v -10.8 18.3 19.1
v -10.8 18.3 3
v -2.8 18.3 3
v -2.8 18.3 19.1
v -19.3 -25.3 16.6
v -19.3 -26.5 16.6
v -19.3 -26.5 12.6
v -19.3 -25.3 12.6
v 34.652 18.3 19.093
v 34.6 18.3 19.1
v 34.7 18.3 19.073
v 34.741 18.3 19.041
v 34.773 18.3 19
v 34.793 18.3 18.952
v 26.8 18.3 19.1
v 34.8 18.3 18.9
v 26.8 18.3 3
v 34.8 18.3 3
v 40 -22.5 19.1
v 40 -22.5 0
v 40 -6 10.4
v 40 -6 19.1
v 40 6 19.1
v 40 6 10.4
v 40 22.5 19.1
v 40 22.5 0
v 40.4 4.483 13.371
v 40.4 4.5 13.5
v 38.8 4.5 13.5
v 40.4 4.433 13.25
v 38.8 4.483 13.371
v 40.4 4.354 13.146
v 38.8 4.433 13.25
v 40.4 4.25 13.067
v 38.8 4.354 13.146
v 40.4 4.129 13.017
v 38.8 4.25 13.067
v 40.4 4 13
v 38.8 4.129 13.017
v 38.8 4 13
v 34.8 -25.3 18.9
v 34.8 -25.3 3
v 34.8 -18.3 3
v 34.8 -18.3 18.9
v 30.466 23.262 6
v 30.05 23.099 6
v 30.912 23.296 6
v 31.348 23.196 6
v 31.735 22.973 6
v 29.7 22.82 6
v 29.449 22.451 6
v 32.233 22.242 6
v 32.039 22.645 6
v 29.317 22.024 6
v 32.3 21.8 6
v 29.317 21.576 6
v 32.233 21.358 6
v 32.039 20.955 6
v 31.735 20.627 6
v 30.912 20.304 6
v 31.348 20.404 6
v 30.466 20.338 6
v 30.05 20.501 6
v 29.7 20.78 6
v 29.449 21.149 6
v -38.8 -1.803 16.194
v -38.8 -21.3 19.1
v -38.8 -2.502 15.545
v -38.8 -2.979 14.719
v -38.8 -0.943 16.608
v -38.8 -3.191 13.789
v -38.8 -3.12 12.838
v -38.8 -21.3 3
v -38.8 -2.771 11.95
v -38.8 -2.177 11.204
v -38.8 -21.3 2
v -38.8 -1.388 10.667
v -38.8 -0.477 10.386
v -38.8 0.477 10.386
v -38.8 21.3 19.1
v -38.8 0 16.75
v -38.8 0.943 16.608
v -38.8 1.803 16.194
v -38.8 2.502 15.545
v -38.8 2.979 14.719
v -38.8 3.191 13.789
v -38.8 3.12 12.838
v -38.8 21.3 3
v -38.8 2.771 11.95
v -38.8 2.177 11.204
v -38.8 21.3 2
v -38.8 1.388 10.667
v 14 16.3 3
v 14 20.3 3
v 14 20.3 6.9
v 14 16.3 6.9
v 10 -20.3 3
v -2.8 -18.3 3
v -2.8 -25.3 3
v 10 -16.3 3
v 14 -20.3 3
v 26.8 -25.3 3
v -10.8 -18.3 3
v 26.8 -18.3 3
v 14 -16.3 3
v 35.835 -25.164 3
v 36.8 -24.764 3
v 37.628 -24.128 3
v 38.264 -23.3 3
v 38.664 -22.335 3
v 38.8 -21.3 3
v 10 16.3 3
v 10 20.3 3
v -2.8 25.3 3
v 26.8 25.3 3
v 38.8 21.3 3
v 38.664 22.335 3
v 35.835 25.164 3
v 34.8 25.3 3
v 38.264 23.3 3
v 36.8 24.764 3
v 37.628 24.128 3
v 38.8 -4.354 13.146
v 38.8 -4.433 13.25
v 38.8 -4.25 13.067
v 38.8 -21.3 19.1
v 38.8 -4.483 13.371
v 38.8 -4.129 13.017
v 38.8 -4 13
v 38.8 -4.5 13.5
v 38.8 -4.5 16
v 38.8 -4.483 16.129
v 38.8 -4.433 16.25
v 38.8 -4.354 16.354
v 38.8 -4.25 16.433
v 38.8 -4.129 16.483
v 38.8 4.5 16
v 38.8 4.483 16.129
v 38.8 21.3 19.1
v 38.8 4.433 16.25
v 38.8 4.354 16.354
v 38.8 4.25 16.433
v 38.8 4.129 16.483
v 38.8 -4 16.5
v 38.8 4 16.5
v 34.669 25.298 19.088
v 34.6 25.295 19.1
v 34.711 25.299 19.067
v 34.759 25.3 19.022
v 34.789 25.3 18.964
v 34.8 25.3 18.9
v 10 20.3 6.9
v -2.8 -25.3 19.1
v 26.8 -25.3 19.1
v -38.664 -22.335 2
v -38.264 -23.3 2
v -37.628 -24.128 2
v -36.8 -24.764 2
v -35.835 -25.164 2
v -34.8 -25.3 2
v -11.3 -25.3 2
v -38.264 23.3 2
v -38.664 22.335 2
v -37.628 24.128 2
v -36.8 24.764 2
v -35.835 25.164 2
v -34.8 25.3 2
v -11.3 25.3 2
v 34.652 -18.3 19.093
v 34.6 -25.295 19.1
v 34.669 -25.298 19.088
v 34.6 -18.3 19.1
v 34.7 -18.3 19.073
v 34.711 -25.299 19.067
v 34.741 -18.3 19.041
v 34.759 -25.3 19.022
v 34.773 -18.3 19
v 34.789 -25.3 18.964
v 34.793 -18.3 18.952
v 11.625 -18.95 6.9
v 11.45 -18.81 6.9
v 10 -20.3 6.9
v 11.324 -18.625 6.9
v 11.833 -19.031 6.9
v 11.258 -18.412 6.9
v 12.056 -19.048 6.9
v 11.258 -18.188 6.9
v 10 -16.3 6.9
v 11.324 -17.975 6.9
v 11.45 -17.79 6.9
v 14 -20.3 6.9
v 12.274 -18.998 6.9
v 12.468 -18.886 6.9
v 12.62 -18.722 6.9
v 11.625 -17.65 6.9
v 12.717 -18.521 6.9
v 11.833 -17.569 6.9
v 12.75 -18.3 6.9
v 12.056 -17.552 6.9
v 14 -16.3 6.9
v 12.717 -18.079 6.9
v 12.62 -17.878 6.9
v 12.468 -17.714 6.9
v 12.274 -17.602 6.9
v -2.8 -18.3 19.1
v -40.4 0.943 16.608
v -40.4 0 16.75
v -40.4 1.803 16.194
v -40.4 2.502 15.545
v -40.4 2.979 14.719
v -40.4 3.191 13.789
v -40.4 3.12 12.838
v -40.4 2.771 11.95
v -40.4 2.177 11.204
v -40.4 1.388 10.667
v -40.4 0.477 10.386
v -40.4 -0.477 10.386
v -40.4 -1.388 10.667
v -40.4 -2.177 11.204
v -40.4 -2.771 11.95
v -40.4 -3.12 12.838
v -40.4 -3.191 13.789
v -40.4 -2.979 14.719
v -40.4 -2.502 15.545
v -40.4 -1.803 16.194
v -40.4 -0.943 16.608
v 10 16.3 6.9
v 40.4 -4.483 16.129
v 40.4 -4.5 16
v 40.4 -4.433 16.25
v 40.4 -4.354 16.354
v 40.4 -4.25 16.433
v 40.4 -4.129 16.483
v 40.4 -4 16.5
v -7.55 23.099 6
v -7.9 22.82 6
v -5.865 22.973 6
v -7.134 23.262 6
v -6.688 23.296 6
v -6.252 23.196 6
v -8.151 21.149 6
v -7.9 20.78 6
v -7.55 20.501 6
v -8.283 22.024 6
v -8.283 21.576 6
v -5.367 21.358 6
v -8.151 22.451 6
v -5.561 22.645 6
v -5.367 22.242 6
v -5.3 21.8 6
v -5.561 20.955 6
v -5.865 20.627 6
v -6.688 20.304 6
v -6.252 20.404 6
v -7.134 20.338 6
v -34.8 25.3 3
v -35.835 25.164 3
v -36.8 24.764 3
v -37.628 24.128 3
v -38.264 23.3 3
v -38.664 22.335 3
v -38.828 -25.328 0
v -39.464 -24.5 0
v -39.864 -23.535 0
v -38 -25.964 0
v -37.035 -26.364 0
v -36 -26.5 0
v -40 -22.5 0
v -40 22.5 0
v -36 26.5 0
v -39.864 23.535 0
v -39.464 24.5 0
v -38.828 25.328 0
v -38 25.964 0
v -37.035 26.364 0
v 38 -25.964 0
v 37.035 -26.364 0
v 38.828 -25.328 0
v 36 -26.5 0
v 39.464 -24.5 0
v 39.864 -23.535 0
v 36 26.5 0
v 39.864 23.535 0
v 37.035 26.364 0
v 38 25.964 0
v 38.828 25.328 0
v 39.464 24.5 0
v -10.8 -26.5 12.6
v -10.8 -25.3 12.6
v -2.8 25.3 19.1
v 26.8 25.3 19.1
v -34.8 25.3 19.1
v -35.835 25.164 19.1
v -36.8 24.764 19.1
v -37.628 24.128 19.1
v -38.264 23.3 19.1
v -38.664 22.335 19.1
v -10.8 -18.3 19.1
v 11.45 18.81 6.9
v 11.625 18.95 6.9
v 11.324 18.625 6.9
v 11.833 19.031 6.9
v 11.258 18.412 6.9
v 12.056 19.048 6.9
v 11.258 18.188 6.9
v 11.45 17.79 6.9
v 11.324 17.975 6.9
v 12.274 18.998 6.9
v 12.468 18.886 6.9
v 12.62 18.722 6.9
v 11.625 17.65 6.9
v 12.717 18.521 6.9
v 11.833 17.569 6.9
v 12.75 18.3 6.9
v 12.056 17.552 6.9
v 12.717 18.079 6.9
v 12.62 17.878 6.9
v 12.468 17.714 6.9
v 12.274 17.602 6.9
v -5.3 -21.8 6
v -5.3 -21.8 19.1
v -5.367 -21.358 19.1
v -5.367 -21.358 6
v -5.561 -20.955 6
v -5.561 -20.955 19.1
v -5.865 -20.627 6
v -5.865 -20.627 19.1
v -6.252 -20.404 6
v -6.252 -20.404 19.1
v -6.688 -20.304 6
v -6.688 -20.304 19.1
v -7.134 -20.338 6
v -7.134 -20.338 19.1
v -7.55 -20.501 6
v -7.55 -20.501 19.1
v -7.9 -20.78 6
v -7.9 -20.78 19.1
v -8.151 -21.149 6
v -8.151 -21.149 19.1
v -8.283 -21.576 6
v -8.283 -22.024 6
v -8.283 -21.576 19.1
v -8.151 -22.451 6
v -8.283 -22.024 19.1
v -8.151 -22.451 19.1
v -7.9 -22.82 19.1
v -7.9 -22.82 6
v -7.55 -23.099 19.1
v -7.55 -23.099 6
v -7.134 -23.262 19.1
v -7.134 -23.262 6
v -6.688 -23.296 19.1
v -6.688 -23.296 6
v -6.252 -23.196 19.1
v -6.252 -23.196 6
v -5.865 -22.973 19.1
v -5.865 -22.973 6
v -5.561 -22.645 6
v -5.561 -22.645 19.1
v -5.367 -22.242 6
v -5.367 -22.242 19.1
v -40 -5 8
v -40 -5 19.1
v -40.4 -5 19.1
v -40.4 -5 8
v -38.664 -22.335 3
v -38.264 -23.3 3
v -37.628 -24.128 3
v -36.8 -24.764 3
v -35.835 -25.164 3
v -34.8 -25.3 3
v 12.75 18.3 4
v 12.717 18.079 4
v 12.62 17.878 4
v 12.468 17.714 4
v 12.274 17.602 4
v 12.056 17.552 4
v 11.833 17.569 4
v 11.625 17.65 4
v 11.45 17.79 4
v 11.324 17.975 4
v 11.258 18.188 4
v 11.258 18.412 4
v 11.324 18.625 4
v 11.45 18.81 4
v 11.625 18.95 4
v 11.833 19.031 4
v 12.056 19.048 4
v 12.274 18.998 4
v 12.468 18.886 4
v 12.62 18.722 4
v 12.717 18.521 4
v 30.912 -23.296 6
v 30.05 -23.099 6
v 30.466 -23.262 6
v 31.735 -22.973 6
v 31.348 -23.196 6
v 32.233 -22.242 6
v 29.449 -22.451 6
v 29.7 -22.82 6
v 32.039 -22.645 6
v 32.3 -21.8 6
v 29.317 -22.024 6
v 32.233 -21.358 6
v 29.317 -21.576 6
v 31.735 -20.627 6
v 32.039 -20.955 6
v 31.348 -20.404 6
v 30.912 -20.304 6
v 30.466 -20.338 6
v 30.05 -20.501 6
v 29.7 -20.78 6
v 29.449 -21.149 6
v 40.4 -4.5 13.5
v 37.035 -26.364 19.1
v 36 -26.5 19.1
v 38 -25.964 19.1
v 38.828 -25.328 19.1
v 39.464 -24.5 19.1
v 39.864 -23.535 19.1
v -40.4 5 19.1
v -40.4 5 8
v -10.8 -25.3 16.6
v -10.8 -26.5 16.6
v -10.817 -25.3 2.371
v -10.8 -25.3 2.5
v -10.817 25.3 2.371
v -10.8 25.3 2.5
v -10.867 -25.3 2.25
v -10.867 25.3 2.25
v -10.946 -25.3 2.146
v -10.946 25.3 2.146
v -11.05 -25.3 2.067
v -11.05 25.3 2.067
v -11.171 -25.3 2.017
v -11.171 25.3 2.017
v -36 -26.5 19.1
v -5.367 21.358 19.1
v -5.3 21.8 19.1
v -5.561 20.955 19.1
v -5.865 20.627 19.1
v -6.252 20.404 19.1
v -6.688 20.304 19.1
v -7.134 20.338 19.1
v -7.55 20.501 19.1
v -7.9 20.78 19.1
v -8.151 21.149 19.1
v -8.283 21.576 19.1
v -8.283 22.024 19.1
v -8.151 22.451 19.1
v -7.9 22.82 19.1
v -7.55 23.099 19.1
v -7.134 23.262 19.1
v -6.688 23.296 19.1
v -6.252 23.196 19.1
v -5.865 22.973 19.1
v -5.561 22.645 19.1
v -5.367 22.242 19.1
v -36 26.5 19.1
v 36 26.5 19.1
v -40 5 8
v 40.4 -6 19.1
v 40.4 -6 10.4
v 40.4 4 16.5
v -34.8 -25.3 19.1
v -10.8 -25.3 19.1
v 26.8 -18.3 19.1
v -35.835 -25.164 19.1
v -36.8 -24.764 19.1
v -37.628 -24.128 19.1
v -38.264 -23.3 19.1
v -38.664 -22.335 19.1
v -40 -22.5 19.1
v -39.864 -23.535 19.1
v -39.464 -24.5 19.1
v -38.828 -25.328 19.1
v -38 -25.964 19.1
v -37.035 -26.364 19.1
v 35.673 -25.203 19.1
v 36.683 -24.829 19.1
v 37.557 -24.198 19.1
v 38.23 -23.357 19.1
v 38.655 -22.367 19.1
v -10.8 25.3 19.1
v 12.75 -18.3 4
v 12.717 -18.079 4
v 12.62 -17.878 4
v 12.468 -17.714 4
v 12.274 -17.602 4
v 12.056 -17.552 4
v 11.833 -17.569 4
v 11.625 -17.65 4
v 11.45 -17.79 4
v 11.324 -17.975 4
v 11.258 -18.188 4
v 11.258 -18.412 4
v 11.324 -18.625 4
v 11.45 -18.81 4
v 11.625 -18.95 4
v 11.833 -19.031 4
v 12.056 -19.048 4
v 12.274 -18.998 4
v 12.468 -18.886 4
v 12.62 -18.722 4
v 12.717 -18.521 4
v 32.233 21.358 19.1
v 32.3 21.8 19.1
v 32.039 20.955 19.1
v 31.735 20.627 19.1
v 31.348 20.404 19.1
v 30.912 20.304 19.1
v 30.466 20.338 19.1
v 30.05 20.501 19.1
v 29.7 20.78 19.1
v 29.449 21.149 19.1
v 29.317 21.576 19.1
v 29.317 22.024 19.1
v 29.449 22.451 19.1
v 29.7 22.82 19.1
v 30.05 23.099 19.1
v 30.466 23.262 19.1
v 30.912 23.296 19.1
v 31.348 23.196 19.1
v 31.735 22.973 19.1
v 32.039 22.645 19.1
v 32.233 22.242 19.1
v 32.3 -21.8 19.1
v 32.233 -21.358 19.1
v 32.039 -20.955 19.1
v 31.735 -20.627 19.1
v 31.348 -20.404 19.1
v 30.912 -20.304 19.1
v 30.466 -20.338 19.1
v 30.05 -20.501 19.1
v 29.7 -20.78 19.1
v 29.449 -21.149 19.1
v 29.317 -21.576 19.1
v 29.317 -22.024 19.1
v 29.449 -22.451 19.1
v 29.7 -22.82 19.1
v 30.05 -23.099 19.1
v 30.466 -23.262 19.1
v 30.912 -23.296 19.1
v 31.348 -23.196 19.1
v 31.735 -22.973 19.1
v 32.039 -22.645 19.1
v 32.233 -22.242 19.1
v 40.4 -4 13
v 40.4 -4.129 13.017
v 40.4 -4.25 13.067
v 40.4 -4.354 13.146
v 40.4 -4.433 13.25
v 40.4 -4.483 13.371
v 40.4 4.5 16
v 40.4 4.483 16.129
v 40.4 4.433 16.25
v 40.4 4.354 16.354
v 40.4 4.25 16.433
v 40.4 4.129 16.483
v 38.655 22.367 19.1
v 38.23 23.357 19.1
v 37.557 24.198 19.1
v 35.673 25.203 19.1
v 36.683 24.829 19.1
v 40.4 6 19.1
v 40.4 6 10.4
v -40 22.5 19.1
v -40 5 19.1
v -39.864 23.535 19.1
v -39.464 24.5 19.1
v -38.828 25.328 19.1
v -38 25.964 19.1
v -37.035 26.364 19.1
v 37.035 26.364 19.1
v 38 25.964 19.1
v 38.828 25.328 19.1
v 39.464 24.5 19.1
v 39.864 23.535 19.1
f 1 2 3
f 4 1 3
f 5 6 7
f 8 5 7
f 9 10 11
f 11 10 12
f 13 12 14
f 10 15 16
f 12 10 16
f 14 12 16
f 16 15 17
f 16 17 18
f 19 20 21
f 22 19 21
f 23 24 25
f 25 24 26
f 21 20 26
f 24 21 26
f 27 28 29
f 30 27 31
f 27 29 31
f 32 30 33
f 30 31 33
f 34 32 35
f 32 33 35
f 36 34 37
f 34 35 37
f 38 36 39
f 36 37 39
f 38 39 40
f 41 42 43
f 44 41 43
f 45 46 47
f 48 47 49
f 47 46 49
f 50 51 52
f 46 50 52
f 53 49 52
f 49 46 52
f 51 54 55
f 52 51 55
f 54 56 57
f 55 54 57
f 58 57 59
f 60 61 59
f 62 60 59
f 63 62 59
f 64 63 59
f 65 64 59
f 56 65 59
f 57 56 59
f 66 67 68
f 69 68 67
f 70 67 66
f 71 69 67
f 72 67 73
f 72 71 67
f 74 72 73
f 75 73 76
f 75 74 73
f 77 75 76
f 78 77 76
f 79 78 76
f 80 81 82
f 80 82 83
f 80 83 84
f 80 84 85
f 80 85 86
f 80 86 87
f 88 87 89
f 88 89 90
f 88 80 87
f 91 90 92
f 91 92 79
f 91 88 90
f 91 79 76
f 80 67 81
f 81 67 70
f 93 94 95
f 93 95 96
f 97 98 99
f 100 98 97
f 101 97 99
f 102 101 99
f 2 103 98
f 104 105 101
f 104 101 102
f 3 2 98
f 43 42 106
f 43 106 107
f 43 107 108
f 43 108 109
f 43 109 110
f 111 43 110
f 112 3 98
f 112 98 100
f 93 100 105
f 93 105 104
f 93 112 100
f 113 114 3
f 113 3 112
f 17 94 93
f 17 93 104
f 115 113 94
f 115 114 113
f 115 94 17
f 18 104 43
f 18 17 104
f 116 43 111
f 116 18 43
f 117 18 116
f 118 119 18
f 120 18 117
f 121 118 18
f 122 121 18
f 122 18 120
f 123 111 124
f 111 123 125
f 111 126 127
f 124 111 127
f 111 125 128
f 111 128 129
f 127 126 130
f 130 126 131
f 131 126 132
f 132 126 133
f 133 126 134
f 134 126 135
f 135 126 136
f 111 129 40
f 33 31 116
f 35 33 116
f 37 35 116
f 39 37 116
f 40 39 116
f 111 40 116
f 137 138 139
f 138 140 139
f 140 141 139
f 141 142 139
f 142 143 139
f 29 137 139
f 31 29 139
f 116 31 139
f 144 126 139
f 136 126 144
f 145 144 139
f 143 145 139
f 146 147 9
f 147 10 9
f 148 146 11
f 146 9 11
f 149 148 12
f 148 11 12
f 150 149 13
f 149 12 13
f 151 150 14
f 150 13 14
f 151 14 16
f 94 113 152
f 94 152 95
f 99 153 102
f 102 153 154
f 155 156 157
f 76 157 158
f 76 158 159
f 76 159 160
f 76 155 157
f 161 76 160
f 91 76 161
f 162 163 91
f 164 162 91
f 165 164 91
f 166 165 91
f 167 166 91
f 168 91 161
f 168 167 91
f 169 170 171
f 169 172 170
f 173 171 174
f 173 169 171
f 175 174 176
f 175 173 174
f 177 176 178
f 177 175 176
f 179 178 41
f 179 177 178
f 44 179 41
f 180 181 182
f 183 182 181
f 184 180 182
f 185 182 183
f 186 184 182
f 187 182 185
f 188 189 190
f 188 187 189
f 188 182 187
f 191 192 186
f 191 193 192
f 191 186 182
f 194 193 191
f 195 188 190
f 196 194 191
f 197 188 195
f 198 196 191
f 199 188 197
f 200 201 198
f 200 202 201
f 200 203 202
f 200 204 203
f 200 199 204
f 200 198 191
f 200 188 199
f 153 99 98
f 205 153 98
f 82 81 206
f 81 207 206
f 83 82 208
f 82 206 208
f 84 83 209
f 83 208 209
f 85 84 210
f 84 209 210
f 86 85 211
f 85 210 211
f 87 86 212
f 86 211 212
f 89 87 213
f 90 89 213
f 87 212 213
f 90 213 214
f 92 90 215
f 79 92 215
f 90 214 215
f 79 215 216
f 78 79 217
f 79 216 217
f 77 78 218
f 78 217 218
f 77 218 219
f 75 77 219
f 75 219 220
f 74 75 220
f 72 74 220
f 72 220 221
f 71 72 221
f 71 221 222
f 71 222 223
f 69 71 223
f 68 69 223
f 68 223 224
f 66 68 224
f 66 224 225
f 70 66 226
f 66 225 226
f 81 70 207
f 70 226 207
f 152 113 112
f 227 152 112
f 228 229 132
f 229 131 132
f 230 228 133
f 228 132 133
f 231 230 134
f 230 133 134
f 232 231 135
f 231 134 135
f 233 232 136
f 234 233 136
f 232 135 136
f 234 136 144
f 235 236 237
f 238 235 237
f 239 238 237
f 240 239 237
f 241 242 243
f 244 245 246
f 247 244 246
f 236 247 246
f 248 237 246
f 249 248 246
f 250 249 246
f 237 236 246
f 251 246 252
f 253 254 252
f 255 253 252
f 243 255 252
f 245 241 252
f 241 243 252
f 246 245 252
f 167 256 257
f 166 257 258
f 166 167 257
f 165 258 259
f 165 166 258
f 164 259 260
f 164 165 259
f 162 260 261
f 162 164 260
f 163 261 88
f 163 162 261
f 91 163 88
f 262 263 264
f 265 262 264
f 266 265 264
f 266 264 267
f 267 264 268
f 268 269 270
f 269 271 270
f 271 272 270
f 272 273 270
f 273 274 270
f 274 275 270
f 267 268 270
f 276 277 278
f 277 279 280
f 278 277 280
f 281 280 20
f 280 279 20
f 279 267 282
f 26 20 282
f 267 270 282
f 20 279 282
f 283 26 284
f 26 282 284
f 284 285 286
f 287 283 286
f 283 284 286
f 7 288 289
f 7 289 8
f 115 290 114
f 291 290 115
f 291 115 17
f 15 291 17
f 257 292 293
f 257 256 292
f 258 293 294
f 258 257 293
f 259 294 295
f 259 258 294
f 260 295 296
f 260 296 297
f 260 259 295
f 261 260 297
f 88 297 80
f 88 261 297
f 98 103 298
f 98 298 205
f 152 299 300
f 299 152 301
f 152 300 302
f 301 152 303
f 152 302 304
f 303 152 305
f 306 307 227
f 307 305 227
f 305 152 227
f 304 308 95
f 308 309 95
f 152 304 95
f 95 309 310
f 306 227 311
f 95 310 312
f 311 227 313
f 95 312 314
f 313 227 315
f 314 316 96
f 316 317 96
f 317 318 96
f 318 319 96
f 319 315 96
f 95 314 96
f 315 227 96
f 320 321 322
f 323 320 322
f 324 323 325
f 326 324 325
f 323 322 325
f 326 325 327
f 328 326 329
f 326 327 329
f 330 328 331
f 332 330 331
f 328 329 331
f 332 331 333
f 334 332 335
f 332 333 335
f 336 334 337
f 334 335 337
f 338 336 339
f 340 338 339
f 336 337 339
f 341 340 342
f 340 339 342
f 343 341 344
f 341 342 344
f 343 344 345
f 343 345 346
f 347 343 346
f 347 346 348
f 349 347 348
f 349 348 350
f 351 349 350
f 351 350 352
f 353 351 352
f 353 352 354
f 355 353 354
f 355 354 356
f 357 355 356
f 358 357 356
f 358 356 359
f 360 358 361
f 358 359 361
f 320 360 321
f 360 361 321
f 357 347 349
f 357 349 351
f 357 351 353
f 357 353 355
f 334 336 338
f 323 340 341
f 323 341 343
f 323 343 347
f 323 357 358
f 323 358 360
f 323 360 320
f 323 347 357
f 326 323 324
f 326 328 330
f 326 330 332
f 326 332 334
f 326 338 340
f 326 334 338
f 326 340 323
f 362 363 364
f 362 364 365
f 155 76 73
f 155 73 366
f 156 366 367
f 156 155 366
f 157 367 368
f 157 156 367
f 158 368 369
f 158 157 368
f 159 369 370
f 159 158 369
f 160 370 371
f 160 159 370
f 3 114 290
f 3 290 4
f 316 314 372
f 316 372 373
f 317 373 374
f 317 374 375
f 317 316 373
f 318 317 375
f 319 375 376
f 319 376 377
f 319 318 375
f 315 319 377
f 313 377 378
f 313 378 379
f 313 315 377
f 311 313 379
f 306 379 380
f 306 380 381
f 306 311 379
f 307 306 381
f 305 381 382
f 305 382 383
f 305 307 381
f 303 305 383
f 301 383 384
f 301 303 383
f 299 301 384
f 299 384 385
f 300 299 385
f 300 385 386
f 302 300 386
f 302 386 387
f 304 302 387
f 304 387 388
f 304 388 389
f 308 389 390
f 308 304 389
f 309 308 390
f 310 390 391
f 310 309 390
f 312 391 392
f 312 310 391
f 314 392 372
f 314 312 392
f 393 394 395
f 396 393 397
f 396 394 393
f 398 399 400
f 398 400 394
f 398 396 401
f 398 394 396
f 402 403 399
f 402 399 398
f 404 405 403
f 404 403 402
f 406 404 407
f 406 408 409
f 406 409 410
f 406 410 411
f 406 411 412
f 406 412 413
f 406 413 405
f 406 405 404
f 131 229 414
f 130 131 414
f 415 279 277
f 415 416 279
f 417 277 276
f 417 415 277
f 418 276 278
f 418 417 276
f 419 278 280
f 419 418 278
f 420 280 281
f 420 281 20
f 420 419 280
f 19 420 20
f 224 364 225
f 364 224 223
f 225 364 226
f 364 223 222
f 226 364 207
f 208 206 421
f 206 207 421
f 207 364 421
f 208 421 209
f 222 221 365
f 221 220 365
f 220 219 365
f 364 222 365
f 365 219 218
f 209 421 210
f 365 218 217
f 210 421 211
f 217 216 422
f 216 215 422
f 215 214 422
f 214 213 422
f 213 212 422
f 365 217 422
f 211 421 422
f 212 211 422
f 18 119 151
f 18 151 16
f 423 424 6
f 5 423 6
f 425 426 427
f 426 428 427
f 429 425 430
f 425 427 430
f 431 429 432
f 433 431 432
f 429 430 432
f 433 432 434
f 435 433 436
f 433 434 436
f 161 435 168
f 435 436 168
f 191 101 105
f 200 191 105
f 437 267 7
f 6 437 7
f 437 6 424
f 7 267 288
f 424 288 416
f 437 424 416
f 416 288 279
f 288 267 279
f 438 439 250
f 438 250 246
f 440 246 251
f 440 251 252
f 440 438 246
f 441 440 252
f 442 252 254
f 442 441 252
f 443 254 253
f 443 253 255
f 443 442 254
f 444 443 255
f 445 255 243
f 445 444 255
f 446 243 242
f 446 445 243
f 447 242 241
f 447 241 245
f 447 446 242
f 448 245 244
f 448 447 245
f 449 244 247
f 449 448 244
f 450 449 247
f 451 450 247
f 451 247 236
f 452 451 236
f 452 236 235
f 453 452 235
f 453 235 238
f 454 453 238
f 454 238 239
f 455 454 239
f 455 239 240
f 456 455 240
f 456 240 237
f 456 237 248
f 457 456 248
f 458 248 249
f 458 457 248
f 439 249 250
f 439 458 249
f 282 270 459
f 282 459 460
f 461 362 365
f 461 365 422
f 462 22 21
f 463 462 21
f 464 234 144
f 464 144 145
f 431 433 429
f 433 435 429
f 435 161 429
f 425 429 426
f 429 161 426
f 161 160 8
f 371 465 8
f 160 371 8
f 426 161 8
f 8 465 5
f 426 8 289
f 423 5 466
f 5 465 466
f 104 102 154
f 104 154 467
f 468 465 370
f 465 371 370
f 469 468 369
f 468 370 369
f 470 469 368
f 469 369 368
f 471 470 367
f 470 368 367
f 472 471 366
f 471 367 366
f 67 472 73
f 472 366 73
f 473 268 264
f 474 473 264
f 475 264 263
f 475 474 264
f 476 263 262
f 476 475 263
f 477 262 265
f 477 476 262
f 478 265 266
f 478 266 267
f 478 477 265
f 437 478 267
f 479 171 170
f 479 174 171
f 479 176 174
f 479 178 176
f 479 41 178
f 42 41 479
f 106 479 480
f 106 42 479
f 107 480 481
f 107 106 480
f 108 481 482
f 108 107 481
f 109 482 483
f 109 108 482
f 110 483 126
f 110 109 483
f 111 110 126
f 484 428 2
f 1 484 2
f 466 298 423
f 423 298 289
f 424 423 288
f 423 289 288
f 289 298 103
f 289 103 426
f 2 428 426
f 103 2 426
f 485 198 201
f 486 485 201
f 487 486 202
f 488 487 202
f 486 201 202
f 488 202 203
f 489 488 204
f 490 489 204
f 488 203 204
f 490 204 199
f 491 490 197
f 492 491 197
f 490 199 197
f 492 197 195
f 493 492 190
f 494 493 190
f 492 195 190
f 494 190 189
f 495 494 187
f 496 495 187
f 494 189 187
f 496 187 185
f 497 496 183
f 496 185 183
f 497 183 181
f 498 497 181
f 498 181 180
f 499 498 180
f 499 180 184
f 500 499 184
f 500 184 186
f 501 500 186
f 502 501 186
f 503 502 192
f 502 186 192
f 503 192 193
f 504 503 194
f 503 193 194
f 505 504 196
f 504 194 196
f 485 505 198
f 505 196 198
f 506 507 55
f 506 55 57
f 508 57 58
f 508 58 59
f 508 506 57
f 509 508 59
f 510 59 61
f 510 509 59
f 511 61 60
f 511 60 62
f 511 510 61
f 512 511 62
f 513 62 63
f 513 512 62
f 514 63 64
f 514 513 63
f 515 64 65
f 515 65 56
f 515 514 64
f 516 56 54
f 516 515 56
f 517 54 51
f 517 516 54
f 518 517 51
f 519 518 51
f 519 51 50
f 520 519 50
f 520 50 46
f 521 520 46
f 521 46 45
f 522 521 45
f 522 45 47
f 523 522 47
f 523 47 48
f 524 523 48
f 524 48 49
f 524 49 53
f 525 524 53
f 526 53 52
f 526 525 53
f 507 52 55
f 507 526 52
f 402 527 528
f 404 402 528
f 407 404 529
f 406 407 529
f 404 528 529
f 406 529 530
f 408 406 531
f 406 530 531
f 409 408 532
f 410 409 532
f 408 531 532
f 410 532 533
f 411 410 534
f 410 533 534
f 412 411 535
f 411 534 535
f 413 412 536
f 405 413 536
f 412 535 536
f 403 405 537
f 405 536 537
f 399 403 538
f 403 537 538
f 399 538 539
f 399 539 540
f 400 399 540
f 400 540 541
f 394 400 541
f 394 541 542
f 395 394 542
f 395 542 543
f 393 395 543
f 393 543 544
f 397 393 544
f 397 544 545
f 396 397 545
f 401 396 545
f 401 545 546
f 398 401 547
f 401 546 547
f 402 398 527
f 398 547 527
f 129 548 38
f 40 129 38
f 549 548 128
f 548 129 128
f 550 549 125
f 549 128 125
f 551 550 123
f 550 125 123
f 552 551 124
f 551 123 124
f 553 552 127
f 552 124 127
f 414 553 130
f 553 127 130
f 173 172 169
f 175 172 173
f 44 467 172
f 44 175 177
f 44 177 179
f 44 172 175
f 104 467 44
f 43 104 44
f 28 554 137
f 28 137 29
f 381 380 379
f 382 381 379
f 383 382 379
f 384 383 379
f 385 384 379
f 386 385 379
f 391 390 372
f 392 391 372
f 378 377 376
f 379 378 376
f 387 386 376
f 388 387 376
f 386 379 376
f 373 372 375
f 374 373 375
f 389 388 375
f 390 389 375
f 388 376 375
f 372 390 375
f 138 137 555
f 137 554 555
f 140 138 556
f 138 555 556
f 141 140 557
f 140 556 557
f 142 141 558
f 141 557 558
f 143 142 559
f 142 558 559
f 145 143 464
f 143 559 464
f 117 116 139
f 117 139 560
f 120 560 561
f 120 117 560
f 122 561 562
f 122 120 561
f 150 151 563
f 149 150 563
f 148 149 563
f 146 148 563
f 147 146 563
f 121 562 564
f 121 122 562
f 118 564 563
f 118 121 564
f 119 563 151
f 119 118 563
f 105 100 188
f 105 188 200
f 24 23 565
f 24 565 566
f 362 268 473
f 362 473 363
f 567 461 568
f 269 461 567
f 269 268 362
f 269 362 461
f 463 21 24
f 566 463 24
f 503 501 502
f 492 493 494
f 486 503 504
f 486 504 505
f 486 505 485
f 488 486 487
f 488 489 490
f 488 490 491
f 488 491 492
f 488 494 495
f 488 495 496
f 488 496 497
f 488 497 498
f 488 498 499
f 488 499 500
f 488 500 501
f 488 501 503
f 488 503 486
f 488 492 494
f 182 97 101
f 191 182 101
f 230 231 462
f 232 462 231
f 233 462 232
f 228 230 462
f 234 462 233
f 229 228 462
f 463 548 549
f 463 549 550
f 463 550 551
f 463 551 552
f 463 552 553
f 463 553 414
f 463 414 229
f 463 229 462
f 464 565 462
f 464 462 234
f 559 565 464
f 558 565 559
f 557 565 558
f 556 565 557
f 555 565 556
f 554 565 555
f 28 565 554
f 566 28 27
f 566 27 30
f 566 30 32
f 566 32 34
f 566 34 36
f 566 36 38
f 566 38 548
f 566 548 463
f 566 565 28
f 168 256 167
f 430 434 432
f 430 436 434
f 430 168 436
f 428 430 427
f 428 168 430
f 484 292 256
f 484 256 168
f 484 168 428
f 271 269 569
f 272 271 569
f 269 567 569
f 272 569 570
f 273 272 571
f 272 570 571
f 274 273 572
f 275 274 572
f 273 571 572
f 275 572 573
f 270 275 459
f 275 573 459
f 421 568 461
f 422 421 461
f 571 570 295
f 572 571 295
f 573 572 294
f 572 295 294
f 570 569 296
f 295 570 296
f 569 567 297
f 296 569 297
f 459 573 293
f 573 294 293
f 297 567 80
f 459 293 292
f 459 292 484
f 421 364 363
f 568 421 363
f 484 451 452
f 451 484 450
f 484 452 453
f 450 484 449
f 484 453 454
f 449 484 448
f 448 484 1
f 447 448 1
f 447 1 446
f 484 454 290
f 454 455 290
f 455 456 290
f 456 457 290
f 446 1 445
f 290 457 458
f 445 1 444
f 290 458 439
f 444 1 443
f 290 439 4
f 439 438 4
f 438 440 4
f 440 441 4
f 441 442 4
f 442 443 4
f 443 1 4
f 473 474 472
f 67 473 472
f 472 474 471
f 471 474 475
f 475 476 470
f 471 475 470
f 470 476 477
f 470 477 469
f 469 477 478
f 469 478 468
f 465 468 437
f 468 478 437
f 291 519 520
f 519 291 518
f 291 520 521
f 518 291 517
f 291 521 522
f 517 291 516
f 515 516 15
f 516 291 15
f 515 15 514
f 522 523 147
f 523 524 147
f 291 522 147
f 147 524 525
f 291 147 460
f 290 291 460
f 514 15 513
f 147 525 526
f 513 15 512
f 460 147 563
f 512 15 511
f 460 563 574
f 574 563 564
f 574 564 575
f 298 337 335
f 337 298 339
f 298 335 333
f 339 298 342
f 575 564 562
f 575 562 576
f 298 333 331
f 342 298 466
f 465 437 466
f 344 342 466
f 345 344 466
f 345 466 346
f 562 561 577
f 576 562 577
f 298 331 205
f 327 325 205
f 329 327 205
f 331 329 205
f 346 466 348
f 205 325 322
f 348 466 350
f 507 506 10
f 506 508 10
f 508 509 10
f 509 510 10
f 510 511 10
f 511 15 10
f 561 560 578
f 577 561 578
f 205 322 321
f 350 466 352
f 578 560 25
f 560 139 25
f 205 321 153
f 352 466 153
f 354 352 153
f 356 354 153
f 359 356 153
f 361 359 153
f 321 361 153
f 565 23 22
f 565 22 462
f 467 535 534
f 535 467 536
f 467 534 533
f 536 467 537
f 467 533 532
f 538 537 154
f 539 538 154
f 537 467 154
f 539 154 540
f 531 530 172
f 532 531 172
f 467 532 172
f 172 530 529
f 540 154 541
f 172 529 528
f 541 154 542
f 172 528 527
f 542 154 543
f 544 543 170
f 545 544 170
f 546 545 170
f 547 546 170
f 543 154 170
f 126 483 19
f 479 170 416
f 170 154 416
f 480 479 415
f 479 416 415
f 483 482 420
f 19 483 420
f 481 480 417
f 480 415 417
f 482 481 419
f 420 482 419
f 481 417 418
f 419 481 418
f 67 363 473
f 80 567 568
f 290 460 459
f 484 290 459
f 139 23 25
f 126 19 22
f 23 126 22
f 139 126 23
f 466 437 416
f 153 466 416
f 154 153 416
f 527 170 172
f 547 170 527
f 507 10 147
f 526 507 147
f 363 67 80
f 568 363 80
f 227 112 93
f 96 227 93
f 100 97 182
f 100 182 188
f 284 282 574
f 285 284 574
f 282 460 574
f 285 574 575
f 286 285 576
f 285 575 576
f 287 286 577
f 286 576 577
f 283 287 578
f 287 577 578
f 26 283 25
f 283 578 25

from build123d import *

# Parameters (mm, degrees)
ESQUISSE1_W                         = 80
ESQUISSE1_H                         = 53
BOSS_EXTRU_1_DEPTH                  = 19.1
ESQUISSE3_W                         = 77.6
ESQUISSE3_H                         = 50.6
ENL_V_MAT_EXTRU_1_DEPTH             = 16.1
CONG_1_R                            = 4
ESQUISSE9_W                         = 8
ESQUISSE9_H                         = 7
BOSS_EXTRU_2_DEPTH                  = 16.1
ESQUISSE11_R                        = 1.5
ENL_V_MAT_EXTRU_2_DEPTH             = 13.1
ESQUISSE14_W                        = 8
ESQUISSE14_H                        = 7
BOSS_EXTRU_3_DEPTH                  = 16.1
ESQUISSE15_R                        = 1.5
ENL_V_MAT_EXTRU_3_DEPTH             = 13.1
ESQUISSE45_W                        = 8.7
ESQUISSE45_H                        = 12
BOSS_EXTRU_8_DEPTH                  = 0.4
ENL_V_MAT_EXTRU_4_REACH             = 88.412
ESQUISSE18_W                        = 3.5
ESQUISSE18_H                        = 9
ENL_V_MAT_EXTRU_4_DIRECTION_2_DEPTH = 87.412151923
CONG_2_R                            = 0.5
ESQUISSE33_W                        = 4
ESQUISSE33_H                        = 4
BOSS_EXTRU_6_DEPTH                  = 3.9
ESQUISSE35_R                        = 0.75
ENL_V_MAT_EXTRU_6_DEPTH             = 2.9
ENL_V_START                         = -1
ENL_V_MAT_EXTRU_7_DEPTH             = 1
CONG_4_R                            = 0.5
ESQUISSE42_W                        = 11.1
ESQUISSE42_H                        = 10
BOSS_EXTRU_9_DEPTH                  = 1.6
ENL_V_MAT_EXTRU_9_REACH             = 88.783
ESQUISSE40_R                        = 3.2
ENL_V_MAT_EXTRU_9_DIRECTION_2_DEPTH = 87.782601943
CONG_5_R                            = 0.2
ENL_V_MAT_EXTRU_10_REACH            = 71.325
ESQUISSE53_W                        = 8.5
ESQUISSE53_H                        = 4


with BuildPart() as part:
    # Esquisse1 → Boss.-Extru.1 (new body)
    with BuildSketch(Plane.XY):
        Rectangle(ESQUISSE1_W, ESQUISSE1_H)
    extrude(amount=BOSS_EXTRU_1_DEPTH)

    # Esquisse3 → Enlèv. mat.-Extru.1 (cut)
    with BuildSketch(Plane.XY.offset(19.1)):
        Rectangle(ESQUISSE3_W, ESQUISSE3_H)
    extrude(amount=-ENL_V_MAT_EXTRU_1_DEPTH, mode=Mode.SUBTRACT)

    # Congé1
    cong_1_edges = [part.edges().sort_by_distance(p)[0] for p in [
        (38.8, 25.3, 11.05),
        (38.8, -25.3, 11.05),
        (-38.8, -25.3, 11.05),
        (-38.8, 25.3, 11.05),
        (40, -26.5, 9.55),
        (-40, -26.5, 9.55),
        (-40, 26.5, 9.55),
        (40, 26.5, 9.55),
    ]]
    fillet(cong_1_edges, radius=CONG_1_R)

    # Esquisse9 → Boss.-Extru.2 (add)
    with BuildSketch(Plane.XY.offset(3)):
        with Locations((-6.8, -21.8)):
            Rectangle(ESQUISSE9_W, ESQUISSE9_H)
    boss_extru_2 = extrude(amount=BOSS_EXTRU_2_DEPTH)

    # Esquisse11 → Enlèv. mat.-Extru.2 (cut)
    with BuildSketch(Plane.XY.offset(19.1)):
        with Locations((-6.8, -21.8)):
            Circle(ESQUISSE11_R)
    enl_v_mat_extru_2 = extrude(amount=-ENL_V_MAT_EXTRU_2_DEPTH, mode=Mode.SUBTRACT)

    # Symétrie2: Boss.-Extru.2, Enlèv. mat.-Extru.2 across plane
    add(boss_extru_2.mirror(Plane.ZX))
    add(enl_v_mat_extru_2.mirror(Plane.ZX), mode=Mode.SUBTRACT)

    # Esquisse14 → Boss.-Extru.3 (add)
    with BuildSketch(Plane.XY.offset(3)):
        with Locations((30.8, -21.8)):
            Rectangle(ESQUISSE14_W, ESQUISSE14_H)
    boss_extru_3 = extrude(amount=BOSS_EXTRU_3_DEPTH)

    # Esquisse15 → Enlèv. mat.-Extru.3 (cut)
    with BuildSketch(Plane.XY.offset(19.1)):
        with Locations((30.8, -21.8)):
            Circle(ESQUISSE15_R)
    enl_v_mat_extru_3 = extrude(amount=-ENL_V_MAT_EXTRU_3_DEPTH, mode=Mode.SUBTRACT)

    # Symétrie3: Boss.-Extru.3, Enlèv. mat.-Extru.3 across plane
    add(boss_extru_3.mirror(Plane.ZX))
    add(enl_v_mat_extru_3.mirror(Plane.ZX), mode=Mode.SUBTRACT)

    # Esquisse45 → Boss.-Extru.8 (add)
    with BuildSketch(Plane(origin=(40, 0, 0), x_dir=(0, 0, -1), z_dir=(1, 0, 0))):
        with Locations((-14.75, 0)):
            Rectangle(ESQUISSE45_W, ESQUISSE45_H)
    extrude(amount=BOSS_EXTRU_8_DEPTH)

    # Esquisse18 → Enlèv. mat.-Extru.4 (cut, up to next)
    with BuildSketch(Plane(origin=(40, 0, 0), x_dir=(0, 0, -1), z_dir=(1, 0, 0)), mode=Mode.PRIVATE) as enl_v_mat_extru_4_sk1:
        with Locations((-14.75, 0)):
            Rectangle(ESQUISSE18_W, ESQUISSE18_H)
    enl_v_mat_extru_4_tool1 = extrude(enl_v_mat_extru_4_sk1.sketch, amount=-ENL_V_MAT_EXTRU_4_REACH, mode=Mode.PRIVATE) & part.part
    add(enl_v_mat_extru_4_tool1.solids().sort_by_distance((40, 0, 14.75))[0], mode=Mode.SUBTRACT)

    # Esquisse18 → Enlèv. mat.-Extru.4 direction 2 (cut)
    with BuildSketch(Plane(origin=(40, 0, 0), x_dir=(0, 0, -1), z_dir=(1, 0, 0))):
        with Locations((-14.75, 0)):
            Rectangle(ESQUISSE18_W, ESQUISSE18_H)
    extrude(amount=ENL_V_MAT_EXTRU_4_DIRECTION_2_DEPTH, mode=Mode.SUBTRACT)

    # Congé2
    cong_2_edges = [part.edges().sort_by_distance(p)[0] for p in [
        (39.6, -4.5, 13),
        (39.6, 4.5, 13),
        (39.6, 4.5, 16.5),
        (39.6, -4.5, 16.5),
    ]]
    fillet(cong_2_edges, radius=CONG_2_R)

    # Esquisse33 → Boss.-Extru.6 (add)
    with BuildSketch(Plane.XY.offset(3)):
        with Locations((12, -18.3)):
            Rectangle(ESQUISSE33_W, ESQUISSE33_H)
    boss_extru_6 = extrude(amount=BOSS_EXTRU_6_DEPTH)

    # Esquisse35 → Enlèv. mat.-Extru.6 (cut)
    with BuildSketch(Plane.XY.offset(6.9)):
        with Locations((12, -18.3)):
            Circle(ESQUISSE35_R)
    enl_v_mat_extru_6 = extrude(amount=-ENL_V_MAT_EXTRU_6_DEPTH, mode=Mode.SUBTRACT)

    # Symétrie4: Boss.-Extru.6, Enlèv. mat.-Extru.6 across plane
    add(boss_extru_6.mirror(Plane.ZX))
    add(enl_v_mat_extru_6.mirror(Plane.ZX), mode=Mode.SUBTRACT)

    # Esquisse38 → Enlèv. mat.-Extru.7 (cut)
    with BuildSketch(Plane.XY.offset(3).offset(ENL_V_START)):
        with BuildLine():
            Line((-10.8, -25.3), (-10.8, 25.3))
            Line((-10.8, 25.3), (-34.8, 25.3))
            ThreePointArc((-34.8, 25.3), (-37.628427125, 24.128427125), (-38.8, 21.3))
            Line((-38.8, 21.3), (-38.8, -21.3))
            ThreePointArc((-38.8, -21.3), (-37.628427125, -24.128427125), (-34.8, -25.3))
            Line((-34.8, -25.3), (-10.8, -25.3))
        make_face()
    extrude(amount=ENL_V_MAT_EXTRU_7_DEPTH, mode=Mode.SUBTRACT)

    # Congé4
    cong_4_edges = [part.edges().sort_by_distance(p)[0] for p in [
        (-10.8, 0, 2),
    ]]
    fillet(cong_4_edges, radius=CONG_4_R)

    # Esquisse42 → Boss.-Extru.9 (add)
    with BuildSketch(Plane(origin=(-38.8, 0, 0), x_dir=(0, 0, -1), z_dir=(1, 0, 0))):
        with Locations((-13.55, 0)):
            Rectangle(ESQUISSE42_W, ESQUISSE42_H)
    extrude(amount=-BOSS_EXTRU_9_DEPTH)

    # Esquisse40 → Enlèv. mat.-Extru.9 (cut, up to next)
    with BuildSketch(Plane.ZY.offset(40), mode=Mode.PRIVATE) as enl_v_mat_extru_9_sk1:
        with Locations((13.55, 0)):
            Circle(ESQUISSE40_R)
    enl_v_mat_extru_9_tool1 = extrude(enl_v_mat_extru_9_sk1.sketch, amount=-ENL_V_MAT_EXTRU_9_REACH, mode=Mode.PRIVATE) & part.part
    add(enl_v_mat_extru_9_tool1.solids().sort_by_distance((-40, 0, 13.55))[0], mode=Mode.SUBTRACT)

    # Esquisse40 → Enlèv. mat.-Extru.9 direction 2 (cut)
    with BuildSketch(Plane.ZY.offset(40)):
        with Locations((13.55, 0)):
            Circle(ESQUISSE40_R)
    extrude(amount=ENL_V_MAT_EXTRU_9_DIRECTION_2_DEPTH, mode=Mode.SUBTRACT)

    # Congé5
    cong_5_edges = [part.edges().sort_by_distance(p)[0] for p in [
        (34.8, -21.8, 19.1),
        (34.8, 21.8, 19.1),
    ]]
    fillet(cong_5_edges, radius=CONG_5_R)

    # Esquisse53 → Enlèv. mat.-Extru.10 (cut, up to next)
    with BuildSketch(Plane(origin=(0, -26.5, 0), x_dir=(-1, 0, 0), z_dir=(0, -1, 0)), mode=Mode.PRIVATE) as enl_v_mat_extru_10_sk1:
        with Locations((15.05, -14.6)):
            Rectangle(ESQUISSE53_W, ESQUISSE53_H)
    enl_v_mat_extru_10_tool1 = extrude(enl_v_mat_extru_10_sk1.sketch, amount=-ENL_V_MAT_EXTRU_10_REACH, mode=Mode.PRIVATE) & part.part
    add(enl_v_mat_extru_10_tool1.solids().sort_by_distance((-15.05, -26.5, 14.6))[0], mode=Mode.SUBTRACT)


solid = part.part
